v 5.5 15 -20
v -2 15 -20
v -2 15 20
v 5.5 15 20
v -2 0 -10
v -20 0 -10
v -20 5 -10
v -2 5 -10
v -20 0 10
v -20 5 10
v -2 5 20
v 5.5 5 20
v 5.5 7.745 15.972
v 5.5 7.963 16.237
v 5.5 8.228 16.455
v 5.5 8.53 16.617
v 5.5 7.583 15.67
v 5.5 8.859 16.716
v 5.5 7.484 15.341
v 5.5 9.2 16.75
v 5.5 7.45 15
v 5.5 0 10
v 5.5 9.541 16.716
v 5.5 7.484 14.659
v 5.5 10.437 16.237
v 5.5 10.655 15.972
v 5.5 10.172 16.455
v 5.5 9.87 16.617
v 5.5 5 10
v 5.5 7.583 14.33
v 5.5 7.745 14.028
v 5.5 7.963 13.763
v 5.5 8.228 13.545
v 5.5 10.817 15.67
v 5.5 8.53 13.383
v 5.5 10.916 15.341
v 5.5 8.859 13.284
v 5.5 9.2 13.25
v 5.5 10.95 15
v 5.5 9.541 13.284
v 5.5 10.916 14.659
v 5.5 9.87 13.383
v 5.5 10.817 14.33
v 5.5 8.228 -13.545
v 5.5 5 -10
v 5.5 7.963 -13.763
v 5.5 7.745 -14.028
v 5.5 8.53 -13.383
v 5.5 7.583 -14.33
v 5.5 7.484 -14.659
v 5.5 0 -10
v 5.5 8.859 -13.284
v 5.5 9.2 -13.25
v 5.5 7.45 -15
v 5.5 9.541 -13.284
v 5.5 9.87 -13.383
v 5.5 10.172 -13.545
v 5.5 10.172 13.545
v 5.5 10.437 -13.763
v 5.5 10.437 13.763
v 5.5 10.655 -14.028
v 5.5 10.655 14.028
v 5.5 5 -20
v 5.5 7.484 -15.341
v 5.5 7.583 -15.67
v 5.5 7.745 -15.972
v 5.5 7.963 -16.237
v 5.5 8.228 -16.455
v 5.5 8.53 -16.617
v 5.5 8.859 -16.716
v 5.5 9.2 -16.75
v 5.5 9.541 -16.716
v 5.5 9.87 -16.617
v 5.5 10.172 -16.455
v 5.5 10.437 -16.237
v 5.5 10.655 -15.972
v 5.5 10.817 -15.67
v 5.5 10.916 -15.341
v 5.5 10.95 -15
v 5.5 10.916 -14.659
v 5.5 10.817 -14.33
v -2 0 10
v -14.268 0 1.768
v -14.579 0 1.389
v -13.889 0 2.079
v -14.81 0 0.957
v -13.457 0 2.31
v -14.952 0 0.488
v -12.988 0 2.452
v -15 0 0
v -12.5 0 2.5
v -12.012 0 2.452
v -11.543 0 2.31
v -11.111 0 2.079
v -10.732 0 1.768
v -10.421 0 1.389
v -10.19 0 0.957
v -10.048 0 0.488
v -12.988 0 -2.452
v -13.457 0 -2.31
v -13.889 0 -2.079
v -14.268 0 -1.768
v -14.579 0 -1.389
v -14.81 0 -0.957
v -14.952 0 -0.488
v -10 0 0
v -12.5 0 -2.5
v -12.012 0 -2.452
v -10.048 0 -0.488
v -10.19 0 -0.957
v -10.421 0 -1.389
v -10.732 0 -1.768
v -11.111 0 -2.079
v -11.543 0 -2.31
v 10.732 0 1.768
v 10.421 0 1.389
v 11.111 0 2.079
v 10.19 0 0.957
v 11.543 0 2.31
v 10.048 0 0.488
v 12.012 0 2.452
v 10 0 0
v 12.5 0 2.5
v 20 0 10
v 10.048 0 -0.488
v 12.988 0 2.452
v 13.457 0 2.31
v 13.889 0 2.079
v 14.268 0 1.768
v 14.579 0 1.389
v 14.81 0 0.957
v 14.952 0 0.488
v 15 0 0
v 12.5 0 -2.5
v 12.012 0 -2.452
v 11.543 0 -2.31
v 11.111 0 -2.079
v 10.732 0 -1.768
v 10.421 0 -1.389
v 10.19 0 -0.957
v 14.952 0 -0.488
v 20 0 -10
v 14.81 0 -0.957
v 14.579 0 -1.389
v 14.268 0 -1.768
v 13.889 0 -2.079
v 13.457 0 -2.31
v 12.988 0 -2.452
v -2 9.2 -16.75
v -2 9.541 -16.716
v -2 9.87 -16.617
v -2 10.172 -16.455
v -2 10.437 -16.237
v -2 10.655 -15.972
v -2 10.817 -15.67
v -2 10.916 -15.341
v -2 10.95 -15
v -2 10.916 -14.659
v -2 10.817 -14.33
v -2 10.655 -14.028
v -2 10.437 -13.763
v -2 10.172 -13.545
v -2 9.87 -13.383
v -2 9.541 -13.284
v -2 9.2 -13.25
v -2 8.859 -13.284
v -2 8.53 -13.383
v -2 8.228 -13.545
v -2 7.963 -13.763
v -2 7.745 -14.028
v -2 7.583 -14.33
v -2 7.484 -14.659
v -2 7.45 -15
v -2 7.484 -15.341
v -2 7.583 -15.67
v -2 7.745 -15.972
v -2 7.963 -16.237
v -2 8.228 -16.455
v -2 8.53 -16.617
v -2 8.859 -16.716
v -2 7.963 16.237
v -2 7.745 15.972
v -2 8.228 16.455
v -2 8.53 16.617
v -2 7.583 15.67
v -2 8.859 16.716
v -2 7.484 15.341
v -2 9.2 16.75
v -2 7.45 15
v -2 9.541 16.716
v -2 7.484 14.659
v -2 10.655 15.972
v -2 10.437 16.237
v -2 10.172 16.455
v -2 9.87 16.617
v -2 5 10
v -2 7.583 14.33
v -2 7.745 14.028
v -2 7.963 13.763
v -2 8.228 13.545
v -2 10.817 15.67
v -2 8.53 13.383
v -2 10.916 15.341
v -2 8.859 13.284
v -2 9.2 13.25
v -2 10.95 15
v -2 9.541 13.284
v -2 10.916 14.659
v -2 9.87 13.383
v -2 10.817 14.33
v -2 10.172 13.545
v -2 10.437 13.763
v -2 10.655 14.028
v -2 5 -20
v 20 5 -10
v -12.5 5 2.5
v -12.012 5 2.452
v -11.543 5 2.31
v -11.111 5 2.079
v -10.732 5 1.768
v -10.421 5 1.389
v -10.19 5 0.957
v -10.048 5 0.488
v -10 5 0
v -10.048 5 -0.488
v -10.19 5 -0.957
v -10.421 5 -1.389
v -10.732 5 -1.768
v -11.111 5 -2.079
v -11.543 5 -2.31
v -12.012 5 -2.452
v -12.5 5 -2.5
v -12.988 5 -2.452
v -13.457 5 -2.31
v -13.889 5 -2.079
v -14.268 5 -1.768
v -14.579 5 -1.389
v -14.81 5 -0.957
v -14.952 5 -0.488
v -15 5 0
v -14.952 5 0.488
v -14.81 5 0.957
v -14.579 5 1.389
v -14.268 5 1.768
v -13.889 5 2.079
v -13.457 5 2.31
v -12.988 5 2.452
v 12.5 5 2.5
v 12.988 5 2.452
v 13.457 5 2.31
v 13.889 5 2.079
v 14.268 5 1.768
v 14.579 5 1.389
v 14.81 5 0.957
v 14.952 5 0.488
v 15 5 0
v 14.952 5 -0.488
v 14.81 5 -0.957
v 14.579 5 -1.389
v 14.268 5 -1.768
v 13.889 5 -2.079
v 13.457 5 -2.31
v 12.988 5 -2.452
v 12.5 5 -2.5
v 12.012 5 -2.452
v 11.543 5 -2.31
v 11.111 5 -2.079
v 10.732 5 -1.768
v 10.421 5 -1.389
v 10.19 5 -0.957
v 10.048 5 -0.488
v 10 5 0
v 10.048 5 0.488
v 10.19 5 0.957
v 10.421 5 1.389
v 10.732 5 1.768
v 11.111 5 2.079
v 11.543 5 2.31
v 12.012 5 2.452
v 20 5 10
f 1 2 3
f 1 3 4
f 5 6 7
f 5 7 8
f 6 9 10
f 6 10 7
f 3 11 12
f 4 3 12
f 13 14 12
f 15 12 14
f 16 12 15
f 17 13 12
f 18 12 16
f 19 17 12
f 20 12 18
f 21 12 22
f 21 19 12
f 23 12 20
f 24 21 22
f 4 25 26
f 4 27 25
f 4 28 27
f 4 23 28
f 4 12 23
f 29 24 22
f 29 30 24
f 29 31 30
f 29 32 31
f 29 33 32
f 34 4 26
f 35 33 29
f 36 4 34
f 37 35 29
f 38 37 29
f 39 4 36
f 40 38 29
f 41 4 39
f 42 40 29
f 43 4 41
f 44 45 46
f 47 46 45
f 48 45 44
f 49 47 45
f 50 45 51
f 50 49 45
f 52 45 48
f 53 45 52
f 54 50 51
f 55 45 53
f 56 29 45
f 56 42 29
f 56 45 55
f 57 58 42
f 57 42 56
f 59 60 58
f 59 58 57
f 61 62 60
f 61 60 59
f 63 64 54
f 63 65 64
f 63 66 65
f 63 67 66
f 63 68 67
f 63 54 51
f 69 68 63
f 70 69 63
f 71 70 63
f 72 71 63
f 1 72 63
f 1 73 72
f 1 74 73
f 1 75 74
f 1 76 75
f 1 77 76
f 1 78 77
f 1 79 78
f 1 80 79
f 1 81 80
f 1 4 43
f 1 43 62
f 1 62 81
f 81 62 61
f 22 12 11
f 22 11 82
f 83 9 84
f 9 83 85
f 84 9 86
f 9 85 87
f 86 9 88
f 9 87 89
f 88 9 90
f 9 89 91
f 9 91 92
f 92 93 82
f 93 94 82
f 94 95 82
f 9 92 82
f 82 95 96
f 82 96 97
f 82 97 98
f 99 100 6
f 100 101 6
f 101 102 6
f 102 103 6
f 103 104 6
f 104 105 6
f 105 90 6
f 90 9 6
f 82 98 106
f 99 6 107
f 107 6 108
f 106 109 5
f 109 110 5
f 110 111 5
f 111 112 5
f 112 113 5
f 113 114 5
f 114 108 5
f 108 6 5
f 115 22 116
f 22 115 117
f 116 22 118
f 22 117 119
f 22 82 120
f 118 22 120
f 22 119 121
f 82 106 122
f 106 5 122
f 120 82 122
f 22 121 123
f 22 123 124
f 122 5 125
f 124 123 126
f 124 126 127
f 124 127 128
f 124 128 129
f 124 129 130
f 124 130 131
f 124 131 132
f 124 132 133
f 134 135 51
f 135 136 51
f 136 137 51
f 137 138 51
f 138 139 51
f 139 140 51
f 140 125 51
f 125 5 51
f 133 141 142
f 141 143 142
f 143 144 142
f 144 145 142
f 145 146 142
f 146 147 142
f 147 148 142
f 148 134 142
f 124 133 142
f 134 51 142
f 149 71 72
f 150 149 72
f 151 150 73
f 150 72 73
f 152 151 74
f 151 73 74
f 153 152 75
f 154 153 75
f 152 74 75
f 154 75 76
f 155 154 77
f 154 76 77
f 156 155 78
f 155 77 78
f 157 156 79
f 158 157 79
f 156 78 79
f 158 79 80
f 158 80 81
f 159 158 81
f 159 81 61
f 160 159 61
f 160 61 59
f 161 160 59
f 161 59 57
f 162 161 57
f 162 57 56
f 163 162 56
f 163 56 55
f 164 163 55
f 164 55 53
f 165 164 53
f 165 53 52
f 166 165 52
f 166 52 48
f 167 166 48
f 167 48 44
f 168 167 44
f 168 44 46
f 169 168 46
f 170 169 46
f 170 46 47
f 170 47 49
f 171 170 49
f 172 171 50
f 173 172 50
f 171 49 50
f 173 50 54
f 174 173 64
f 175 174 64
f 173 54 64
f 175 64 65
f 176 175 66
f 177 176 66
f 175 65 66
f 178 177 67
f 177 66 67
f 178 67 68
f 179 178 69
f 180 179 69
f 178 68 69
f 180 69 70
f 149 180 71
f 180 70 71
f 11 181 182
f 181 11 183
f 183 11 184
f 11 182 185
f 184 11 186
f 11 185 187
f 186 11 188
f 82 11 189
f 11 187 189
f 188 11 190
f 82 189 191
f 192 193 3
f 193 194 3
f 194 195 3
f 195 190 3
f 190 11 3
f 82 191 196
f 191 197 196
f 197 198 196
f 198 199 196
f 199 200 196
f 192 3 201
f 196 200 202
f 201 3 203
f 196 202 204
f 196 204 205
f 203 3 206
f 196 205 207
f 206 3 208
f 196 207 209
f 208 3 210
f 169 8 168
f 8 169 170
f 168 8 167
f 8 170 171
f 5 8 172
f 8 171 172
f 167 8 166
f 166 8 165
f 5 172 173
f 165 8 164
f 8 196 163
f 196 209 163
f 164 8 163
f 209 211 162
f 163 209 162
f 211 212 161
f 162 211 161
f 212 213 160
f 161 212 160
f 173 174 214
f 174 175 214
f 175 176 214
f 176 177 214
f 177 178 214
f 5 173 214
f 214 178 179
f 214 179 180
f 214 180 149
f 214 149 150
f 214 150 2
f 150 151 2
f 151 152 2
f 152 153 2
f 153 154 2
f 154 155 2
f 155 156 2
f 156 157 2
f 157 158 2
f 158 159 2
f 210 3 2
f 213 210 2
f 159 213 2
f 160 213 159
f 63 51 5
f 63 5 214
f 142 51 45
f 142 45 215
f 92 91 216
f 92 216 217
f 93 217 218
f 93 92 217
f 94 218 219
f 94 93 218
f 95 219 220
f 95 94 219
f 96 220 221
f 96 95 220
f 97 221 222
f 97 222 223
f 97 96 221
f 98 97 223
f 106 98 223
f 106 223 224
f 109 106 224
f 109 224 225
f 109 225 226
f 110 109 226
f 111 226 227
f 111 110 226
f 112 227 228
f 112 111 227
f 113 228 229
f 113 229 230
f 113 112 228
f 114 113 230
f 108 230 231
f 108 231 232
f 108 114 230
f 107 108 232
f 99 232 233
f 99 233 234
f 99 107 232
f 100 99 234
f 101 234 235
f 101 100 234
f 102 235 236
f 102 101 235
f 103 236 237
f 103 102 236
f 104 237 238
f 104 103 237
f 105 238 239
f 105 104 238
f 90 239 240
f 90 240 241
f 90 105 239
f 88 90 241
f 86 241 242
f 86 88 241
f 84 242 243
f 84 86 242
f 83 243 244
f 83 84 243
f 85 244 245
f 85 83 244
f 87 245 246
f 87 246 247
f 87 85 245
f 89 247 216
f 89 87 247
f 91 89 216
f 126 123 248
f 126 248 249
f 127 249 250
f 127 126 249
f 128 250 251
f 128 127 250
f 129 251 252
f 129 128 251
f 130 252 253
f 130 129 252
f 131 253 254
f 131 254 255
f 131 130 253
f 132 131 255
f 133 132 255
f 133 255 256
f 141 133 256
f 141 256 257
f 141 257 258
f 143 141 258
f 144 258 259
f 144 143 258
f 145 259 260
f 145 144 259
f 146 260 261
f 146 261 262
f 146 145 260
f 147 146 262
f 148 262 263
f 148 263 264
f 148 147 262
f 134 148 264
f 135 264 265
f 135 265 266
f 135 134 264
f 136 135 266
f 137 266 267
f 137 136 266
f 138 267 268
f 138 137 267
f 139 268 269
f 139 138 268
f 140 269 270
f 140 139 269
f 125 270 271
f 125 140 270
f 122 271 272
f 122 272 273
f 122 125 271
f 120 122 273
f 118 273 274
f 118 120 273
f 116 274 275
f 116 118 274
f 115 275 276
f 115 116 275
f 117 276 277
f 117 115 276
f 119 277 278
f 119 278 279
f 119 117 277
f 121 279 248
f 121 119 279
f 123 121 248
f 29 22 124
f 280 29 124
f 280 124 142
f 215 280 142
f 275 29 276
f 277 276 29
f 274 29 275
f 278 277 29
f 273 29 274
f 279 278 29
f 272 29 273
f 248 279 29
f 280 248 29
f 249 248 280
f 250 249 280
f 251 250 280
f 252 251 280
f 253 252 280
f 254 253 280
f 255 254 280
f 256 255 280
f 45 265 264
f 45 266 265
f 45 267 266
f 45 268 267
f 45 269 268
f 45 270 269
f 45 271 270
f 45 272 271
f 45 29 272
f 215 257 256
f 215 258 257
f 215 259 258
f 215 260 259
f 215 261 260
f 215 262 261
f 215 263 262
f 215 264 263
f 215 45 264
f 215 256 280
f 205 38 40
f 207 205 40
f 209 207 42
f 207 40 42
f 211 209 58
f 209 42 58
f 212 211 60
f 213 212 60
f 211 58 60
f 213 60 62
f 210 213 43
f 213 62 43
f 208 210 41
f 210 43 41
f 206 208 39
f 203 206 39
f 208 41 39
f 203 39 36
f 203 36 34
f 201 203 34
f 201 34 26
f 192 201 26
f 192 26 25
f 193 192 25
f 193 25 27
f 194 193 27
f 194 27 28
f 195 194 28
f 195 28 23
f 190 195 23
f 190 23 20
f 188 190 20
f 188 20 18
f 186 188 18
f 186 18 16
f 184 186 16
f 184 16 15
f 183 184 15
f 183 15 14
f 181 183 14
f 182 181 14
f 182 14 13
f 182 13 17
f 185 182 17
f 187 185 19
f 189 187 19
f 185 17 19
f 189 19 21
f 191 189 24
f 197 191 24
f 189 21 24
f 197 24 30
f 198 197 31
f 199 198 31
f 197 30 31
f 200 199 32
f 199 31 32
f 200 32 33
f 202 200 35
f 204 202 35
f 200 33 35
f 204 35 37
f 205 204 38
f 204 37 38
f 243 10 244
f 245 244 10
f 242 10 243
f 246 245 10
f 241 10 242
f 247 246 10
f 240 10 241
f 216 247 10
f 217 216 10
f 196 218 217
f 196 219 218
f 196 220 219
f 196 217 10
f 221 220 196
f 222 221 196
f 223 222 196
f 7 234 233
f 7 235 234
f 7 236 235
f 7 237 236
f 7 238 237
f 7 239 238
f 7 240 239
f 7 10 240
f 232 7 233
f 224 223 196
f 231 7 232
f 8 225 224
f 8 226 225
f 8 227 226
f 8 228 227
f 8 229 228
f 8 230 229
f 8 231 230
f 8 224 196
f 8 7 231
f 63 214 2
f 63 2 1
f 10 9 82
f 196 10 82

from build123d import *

# Parameters (mm, degrees)
SKETCH_1_W          = 40
SKETCH_1_H          = 20
SKETCH_1_R          = 2.5
EXTRUDE_1_DEPTH     = 5
SKETCH_2_W          = 7.5
SKETCH_2_H          = 40
EXTRUDE_2_DEPTH     = 10
SKETCH_3_R          = 1.75
CUT_EXTRUDE_1_DEPTH = 10
EXTRUDE_3_DEPTH     = 7.5


with BuildPart() as part:
    # 草图1 → 凸台-拉伸1 (new body)
    with BuildSketch(Plane(origin=(0, 0, 0), x_dir=(1, 0, 0), z_dir=(0, 1, 0))):
        Rectangle(SKETCH_1_W, SKETCH_1_H)
        with Locations(Location((-12.5, 0, 0), (0, 0, 270))):
            Circle(SKETCH_1_R, mode=Mode.SUBTRACT)
        with Locations(Location((12.5, 0, 0), (0, 0, 270))):
            Circle(SKETCH_1_R, mode=Mode.SUBTRACT)
    extrude(amount=EXTRUDE_1_DEPTH)

    # 草图2 → 凸台-拉伸2 (add)
    with BuildSketch(Plane(origin=(0, 5, 0), x_dir=(1, 0, 0), z_dir=(0, 1, 0))):
        with Locations((1.75, 0)):
            Rectangle(SKETCH_2_W, SKETCH_2_H)
    extrude(amount=EXTRUDE_2_DEPTH)

    # 草图3 → 切除-拉伸1 (cut)
    with BuildSketch(Plane(origin=(5.5, 0, 0), x_dir=(0, 0, -1), z_dir=(1, 0, 0))):
        with Locations((-15, 9.2)):
            Circle(SKETCH_3_R)
        with Locations((15, 9.2)):
            Circle(SKETCH_3_R)
    extrude(amount=-CUT_EXTRUDE_1_DEPTH, mode=Mode.SUBTRACT)

    # 草图4 → 凸台-拉伸3 (add)
    with BuildSketch(Plane(origin=(5.5, 0, 0), x_dir=(0, 0, -1), z_dir=(1, 0, 0))):
        Polygon((-20, 5), (-10, 0), (-10, 5), align=None)
        Polygon((10, 5), (10, 0), (20, 5), align=None)
    extrude(amount=-EXTRUDE_3_DEPTH)


solid = part.part
